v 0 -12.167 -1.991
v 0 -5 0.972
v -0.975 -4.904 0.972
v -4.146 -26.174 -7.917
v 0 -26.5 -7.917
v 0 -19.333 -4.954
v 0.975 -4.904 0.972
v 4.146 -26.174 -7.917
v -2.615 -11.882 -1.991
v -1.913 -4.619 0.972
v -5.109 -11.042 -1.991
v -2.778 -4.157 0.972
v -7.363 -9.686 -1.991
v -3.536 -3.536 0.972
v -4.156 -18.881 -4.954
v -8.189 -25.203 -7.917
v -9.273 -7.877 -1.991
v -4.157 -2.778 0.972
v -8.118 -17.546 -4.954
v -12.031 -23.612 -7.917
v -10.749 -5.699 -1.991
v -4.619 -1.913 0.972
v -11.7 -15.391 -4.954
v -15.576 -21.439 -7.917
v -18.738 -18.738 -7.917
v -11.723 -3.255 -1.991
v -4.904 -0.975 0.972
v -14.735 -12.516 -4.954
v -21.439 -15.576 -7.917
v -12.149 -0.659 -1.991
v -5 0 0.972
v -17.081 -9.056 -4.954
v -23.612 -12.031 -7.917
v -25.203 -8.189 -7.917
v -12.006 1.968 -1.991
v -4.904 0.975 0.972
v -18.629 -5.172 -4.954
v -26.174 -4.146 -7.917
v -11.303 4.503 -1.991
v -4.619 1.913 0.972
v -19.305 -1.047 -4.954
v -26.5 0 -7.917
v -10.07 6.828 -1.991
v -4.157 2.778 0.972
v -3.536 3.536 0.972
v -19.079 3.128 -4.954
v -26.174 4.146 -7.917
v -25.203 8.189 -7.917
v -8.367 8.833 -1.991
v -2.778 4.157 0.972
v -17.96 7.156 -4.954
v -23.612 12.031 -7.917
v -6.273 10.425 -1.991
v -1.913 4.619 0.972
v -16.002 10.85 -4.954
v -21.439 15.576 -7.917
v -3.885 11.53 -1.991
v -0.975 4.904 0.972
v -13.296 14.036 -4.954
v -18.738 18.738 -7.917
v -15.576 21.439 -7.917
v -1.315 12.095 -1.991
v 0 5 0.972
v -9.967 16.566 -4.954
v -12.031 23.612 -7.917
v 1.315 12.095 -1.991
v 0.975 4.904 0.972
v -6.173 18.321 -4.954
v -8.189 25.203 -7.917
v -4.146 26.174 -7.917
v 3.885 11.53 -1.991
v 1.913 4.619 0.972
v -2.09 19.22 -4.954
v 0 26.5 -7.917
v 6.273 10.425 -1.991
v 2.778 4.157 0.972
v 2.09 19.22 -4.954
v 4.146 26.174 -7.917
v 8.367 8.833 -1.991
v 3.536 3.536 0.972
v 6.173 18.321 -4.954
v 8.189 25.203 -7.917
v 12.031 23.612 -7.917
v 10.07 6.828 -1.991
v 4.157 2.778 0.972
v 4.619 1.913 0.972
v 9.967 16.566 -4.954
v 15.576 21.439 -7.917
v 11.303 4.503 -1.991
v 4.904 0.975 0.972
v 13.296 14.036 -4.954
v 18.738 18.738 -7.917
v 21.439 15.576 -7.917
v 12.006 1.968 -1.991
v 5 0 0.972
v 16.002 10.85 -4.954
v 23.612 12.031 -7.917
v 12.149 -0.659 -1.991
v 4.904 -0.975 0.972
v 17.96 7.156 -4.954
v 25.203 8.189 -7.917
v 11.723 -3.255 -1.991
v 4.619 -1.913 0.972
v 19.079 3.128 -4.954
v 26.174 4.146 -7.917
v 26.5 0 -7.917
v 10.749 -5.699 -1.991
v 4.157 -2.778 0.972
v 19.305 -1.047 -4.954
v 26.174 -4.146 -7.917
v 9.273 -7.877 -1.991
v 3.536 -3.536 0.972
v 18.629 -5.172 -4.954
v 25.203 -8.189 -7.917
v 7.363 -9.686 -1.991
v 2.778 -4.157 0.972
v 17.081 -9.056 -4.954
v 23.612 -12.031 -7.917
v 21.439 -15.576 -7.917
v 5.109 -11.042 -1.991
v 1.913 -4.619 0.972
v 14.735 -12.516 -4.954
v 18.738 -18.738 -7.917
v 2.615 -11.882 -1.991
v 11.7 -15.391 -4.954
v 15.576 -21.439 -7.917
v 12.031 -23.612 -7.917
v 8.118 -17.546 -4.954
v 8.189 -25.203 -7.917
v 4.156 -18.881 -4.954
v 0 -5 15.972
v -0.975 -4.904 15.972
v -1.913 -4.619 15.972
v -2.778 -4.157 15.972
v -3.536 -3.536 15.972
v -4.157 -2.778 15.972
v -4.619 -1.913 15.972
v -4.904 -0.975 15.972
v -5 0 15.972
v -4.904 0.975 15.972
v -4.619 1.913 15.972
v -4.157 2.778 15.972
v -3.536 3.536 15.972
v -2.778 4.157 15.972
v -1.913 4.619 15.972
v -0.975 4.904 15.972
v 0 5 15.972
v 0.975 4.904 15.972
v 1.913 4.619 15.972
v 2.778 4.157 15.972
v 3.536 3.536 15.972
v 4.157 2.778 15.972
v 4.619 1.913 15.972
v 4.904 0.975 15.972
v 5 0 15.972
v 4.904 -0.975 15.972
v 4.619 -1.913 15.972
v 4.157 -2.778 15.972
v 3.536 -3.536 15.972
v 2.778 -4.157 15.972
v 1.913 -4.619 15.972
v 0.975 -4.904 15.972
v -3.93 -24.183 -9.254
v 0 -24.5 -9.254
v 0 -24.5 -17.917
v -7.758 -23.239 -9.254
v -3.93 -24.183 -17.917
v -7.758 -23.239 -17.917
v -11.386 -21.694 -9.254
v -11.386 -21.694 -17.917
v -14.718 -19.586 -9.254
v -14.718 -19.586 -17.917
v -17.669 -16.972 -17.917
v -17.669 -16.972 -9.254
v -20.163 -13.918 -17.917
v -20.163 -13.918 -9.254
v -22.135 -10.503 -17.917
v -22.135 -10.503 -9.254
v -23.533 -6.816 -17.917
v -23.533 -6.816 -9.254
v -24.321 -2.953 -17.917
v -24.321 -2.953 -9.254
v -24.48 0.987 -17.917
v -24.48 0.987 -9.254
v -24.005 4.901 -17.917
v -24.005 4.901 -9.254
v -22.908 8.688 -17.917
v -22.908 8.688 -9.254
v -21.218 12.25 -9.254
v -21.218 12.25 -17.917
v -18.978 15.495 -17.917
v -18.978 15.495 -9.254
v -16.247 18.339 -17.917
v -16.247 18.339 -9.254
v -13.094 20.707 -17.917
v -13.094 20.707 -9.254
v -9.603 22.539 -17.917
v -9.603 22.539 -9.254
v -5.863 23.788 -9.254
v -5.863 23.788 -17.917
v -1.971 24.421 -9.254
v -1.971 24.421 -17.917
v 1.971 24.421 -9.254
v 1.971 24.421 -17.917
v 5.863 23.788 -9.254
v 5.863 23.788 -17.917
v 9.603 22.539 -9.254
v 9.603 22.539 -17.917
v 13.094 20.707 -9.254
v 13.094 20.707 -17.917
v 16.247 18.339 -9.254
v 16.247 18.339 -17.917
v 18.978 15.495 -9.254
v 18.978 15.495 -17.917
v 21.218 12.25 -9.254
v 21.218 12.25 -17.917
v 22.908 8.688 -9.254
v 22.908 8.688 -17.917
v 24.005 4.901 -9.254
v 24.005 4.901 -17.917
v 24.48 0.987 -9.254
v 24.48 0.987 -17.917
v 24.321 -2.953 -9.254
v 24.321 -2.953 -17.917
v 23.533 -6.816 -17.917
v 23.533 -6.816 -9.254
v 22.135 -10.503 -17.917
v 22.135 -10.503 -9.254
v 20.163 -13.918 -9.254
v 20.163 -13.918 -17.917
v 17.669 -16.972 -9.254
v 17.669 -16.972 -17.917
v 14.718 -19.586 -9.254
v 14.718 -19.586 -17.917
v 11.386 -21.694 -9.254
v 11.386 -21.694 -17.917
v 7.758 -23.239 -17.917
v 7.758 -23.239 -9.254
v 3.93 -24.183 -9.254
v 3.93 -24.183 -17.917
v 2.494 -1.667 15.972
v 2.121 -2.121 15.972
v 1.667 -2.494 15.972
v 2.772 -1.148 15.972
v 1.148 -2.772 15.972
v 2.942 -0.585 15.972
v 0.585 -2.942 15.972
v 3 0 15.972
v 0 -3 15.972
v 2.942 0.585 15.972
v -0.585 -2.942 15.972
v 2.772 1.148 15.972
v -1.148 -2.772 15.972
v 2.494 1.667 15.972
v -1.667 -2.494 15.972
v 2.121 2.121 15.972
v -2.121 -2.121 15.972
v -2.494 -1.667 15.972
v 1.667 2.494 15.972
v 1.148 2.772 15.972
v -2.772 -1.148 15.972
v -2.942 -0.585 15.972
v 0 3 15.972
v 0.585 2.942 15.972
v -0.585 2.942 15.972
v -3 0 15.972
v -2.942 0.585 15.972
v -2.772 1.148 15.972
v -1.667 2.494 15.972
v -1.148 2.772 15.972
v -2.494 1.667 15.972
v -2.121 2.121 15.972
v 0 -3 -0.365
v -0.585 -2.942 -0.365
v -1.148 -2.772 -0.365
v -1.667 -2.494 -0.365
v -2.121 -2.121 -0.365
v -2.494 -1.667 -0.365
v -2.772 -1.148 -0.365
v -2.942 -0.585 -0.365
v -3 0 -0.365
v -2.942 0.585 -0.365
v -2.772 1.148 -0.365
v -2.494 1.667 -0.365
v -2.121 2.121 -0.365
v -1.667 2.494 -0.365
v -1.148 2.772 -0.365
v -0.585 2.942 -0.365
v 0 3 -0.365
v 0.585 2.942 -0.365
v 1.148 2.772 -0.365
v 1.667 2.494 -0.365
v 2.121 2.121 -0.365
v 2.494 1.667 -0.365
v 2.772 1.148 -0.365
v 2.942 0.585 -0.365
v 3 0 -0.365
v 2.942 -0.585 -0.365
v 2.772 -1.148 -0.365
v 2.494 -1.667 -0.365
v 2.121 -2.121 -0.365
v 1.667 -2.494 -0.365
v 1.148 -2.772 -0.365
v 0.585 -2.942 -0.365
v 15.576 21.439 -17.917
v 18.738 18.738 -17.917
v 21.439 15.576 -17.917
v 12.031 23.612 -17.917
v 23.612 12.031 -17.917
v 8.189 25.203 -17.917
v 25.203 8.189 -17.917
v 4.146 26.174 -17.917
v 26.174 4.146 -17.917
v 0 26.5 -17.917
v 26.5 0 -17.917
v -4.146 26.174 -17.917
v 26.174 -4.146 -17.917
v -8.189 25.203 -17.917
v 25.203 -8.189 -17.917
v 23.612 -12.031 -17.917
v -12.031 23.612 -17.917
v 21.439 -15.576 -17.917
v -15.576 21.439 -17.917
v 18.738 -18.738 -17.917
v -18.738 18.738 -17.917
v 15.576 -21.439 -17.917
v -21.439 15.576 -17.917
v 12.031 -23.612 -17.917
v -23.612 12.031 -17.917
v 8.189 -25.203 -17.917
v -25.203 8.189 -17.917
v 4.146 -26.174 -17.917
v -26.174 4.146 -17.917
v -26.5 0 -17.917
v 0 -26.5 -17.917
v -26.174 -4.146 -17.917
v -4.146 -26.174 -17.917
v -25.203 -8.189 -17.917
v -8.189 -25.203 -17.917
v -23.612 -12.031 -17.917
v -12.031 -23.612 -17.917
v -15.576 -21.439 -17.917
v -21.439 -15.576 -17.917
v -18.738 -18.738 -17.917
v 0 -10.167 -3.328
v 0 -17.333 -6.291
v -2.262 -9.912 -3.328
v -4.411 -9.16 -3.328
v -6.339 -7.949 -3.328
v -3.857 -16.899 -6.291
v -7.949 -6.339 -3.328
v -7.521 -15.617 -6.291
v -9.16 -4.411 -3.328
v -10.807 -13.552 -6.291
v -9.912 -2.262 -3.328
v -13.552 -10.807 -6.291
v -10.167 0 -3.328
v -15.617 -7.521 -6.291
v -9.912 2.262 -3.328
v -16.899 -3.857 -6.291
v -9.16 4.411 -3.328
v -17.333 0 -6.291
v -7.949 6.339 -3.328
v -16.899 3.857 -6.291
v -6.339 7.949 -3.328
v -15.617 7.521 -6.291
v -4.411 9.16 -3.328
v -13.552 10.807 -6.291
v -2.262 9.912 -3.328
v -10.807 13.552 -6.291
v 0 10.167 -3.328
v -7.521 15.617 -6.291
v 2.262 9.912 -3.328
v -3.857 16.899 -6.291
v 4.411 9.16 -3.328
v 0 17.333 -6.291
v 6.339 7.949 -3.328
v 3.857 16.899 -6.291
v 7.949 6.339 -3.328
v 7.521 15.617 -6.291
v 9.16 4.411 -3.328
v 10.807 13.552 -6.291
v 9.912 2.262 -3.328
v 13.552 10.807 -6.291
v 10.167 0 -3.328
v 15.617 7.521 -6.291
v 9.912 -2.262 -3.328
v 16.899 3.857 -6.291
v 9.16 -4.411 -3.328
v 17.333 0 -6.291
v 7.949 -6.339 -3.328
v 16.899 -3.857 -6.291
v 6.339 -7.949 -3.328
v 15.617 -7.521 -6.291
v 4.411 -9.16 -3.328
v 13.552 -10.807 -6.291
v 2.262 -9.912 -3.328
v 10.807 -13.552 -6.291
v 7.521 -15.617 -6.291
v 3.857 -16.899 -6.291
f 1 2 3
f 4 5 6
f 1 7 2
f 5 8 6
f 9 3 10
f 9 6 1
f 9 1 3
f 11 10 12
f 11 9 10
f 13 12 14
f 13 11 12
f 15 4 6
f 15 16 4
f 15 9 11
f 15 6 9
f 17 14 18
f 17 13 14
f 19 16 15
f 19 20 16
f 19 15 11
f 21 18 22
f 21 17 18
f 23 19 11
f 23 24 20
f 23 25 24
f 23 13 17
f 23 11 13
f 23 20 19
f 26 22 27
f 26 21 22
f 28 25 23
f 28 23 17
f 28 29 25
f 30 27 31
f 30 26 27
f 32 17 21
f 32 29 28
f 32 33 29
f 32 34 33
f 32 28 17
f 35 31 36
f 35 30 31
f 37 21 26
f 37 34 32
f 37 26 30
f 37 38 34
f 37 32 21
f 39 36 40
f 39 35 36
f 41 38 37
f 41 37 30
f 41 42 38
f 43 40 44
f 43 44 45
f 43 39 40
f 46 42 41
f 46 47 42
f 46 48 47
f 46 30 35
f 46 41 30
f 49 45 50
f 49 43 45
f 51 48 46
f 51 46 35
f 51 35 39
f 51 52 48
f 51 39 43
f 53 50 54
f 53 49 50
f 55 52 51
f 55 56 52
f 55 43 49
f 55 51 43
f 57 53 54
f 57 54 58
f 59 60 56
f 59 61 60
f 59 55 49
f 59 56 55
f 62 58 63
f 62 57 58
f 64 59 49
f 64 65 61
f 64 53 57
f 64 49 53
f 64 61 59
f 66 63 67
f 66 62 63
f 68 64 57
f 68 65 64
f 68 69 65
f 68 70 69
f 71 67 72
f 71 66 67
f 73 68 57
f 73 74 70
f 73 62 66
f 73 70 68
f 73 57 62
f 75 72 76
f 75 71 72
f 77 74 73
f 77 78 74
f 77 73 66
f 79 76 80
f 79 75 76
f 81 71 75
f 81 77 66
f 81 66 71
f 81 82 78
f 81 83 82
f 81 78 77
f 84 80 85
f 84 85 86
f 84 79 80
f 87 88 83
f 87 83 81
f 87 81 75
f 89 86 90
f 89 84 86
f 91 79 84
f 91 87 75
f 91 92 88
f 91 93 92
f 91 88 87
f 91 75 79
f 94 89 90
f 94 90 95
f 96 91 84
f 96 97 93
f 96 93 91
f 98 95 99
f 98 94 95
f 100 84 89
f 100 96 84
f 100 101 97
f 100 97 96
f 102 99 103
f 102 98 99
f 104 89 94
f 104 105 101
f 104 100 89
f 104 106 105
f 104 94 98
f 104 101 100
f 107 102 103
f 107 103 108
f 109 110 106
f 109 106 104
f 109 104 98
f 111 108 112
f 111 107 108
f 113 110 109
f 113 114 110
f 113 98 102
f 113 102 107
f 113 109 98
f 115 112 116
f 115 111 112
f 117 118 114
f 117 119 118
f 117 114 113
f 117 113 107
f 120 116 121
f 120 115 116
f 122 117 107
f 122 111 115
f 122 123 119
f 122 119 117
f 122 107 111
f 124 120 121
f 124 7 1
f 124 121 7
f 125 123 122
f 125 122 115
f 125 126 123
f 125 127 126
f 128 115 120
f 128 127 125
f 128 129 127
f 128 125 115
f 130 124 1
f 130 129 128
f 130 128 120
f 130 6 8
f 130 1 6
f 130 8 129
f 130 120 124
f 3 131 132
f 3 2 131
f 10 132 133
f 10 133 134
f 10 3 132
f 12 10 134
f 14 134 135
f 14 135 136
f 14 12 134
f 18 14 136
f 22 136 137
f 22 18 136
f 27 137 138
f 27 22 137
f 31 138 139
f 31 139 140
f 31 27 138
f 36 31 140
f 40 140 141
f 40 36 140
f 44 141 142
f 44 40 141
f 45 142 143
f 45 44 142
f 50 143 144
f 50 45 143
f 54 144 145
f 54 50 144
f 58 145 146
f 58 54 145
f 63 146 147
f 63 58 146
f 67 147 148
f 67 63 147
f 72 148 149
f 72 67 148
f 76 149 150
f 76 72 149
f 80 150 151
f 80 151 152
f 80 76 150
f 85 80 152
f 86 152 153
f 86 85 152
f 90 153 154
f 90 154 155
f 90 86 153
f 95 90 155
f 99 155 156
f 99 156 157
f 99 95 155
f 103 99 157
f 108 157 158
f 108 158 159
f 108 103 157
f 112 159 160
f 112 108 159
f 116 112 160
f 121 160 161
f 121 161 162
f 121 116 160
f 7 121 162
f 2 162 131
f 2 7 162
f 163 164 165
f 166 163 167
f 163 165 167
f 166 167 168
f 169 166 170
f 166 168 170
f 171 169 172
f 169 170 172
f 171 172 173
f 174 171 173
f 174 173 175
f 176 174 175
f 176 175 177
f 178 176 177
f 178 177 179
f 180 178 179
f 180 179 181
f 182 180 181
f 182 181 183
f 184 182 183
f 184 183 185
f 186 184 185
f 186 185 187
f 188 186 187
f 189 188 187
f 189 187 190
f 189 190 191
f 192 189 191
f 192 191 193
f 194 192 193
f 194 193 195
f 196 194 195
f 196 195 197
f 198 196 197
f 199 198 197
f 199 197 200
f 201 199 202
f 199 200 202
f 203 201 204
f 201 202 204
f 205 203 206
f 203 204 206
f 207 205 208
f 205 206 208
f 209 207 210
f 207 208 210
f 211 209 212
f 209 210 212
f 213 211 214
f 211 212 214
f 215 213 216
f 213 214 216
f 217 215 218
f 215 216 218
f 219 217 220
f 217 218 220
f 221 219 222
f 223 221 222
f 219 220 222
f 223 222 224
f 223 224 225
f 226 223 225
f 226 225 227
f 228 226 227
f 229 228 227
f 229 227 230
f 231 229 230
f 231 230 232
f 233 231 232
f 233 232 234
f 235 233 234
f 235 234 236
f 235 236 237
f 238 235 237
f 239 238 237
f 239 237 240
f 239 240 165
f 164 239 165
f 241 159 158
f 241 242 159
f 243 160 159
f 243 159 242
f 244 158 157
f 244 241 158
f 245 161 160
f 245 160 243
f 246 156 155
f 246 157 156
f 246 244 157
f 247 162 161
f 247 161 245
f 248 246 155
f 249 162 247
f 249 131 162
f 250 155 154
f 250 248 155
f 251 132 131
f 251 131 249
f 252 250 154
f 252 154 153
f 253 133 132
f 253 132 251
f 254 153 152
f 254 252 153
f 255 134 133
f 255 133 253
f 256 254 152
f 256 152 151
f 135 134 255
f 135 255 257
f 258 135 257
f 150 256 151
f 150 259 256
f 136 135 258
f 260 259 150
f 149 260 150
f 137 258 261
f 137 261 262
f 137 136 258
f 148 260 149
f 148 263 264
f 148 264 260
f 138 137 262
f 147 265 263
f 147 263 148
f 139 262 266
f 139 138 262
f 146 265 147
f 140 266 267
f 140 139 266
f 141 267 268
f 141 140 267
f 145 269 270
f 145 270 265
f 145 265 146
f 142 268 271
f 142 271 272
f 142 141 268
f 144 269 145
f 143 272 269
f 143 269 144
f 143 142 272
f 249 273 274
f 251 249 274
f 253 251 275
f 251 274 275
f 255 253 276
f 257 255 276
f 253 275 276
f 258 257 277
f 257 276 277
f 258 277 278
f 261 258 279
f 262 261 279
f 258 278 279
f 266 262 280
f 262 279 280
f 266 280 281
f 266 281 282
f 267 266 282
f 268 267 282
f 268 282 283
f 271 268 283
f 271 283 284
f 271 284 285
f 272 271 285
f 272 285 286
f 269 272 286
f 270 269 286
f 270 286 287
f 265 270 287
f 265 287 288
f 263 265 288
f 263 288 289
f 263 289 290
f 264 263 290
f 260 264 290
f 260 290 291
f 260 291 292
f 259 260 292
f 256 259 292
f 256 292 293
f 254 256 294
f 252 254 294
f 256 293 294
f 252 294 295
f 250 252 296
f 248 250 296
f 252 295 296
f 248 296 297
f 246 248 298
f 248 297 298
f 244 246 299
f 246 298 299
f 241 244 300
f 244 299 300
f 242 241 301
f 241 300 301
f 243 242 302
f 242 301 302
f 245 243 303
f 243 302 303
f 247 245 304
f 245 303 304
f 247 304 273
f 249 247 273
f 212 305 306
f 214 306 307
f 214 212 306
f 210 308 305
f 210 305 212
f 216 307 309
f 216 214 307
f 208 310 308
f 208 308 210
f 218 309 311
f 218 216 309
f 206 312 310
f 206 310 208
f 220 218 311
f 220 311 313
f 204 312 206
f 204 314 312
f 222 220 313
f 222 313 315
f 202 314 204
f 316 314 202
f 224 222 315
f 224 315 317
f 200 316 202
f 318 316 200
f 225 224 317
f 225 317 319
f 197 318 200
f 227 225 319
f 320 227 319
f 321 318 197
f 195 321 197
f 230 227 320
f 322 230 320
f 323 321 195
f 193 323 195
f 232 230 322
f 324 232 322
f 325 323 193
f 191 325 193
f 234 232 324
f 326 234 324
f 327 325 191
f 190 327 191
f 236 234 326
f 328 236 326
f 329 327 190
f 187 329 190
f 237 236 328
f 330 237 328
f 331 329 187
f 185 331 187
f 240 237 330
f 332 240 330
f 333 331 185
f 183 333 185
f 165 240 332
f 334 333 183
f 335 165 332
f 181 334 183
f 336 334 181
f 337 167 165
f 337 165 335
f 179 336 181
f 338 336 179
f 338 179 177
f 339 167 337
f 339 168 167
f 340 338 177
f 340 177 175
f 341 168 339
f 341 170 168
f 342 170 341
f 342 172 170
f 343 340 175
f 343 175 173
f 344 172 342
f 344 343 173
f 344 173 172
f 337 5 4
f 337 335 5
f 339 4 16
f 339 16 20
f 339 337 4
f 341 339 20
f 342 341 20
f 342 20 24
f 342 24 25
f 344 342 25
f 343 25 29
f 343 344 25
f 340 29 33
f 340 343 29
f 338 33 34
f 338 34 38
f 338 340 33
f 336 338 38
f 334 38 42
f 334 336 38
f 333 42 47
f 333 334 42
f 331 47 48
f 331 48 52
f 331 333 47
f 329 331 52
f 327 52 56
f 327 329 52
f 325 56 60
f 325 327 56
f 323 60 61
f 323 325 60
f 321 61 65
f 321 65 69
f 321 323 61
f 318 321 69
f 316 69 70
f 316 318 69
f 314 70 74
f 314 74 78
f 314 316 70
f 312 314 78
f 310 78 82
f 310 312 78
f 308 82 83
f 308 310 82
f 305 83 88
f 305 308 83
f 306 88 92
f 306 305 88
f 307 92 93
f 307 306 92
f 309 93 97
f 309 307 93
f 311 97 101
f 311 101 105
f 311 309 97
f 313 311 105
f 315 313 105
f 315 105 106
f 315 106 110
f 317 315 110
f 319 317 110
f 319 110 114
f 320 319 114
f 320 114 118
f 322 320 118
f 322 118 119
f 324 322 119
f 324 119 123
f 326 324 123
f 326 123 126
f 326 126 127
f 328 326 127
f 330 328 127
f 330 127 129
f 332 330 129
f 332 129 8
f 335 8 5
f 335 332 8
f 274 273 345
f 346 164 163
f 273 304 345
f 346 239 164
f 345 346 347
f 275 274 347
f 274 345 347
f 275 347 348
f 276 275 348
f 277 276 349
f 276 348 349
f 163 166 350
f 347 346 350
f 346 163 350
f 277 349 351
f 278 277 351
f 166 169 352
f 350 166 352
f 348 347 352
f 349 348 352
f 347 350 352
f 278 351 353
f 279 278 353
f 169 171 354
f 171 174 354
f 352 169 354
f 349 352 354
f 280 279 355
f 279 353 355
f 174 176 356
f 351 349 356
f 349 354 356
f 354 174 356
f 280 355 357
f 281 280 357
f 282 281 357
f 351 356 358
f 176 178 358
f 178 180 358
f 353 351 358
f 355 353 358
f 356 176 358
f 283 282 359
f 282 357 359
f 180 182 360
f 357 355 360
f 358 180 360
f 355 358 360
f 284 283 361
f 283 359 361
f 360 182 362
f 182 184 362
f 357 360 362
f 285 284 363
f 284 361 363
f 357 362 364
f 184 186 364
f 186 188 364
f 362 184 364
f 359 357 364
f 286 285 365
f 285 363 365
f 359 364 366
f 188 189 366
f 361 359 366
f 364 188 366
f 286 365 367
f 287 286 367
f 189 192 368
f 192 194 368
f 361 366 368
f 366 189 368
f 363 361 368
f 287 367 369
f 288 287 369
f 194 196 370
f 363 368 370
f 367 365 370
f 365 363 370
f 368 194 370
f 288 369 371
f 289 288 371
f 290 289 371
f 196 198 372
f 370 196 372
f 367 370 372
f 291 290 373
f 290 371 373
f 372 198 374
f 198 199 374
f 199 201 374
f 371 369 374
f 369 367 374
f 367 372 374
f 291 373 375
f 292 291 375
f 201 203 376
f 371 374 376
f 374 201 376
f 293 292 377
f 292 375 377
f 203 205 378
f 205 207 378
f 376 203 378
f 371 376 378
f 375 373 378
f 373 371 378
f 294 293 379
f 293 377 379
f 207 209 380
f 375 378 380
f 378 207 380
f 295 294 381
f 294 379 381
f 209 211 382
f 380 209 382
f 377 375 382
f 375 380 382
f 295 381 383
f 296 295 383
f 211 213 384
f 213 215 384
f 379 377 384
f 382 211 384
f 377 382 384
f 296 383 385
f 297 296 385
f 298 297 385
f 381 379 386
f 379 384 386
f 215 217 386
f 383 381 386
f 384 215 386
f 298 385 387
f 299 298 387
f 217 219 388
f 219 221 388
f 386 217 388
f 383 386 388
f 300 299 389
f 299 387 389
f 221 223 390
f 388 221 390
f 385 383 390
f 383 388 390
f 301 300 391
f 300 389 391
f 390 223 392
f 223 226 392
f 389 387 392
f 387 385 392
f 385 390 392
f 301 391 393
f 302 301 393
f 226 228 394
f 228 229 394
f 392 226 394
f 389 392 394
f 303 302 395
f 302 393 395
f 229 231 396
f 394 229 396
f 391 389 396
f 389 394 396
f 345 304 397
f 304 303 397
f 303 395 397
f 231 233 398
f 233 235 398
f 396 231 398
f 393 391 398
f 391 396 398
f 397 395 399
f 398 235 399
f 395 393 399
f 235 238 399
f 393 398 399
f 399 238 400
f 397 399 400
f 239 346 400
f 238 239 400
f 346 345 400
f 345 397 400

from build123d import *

# Parameters (mm, degrees)
F2_T = -2


# Not quite as in the source:
# - the program builds the solid bodies; features that only make, move or delete a surface that nothing else refers to are left out


with BuildPart() as f1:
    # F0 (on Right) → F1 (revolve)
    with BuildSketch(Plane.YZ):
        Polygon((0, 15.9718455747), (-5, 15.9718455747), (-5, 0.9718455747), (-26.5, -7.9165611044), (-26.5, -17.9165611044), (0, -17.9165611044), align=None)
    revolve(axis=Axis((0, 0, -0.4027476534), (0, 0, -1)))

    # F2
    f2_openings = [f1.faces().sort_by_distance(p)[0] for p in [
        (0, 0, -17.916561),
        (0, 0, 15.971846),
    ]]
    offset(amount=F2_T, openings=f2_openings, kind=Kind.INTERSECTION)


solid = f1.part
